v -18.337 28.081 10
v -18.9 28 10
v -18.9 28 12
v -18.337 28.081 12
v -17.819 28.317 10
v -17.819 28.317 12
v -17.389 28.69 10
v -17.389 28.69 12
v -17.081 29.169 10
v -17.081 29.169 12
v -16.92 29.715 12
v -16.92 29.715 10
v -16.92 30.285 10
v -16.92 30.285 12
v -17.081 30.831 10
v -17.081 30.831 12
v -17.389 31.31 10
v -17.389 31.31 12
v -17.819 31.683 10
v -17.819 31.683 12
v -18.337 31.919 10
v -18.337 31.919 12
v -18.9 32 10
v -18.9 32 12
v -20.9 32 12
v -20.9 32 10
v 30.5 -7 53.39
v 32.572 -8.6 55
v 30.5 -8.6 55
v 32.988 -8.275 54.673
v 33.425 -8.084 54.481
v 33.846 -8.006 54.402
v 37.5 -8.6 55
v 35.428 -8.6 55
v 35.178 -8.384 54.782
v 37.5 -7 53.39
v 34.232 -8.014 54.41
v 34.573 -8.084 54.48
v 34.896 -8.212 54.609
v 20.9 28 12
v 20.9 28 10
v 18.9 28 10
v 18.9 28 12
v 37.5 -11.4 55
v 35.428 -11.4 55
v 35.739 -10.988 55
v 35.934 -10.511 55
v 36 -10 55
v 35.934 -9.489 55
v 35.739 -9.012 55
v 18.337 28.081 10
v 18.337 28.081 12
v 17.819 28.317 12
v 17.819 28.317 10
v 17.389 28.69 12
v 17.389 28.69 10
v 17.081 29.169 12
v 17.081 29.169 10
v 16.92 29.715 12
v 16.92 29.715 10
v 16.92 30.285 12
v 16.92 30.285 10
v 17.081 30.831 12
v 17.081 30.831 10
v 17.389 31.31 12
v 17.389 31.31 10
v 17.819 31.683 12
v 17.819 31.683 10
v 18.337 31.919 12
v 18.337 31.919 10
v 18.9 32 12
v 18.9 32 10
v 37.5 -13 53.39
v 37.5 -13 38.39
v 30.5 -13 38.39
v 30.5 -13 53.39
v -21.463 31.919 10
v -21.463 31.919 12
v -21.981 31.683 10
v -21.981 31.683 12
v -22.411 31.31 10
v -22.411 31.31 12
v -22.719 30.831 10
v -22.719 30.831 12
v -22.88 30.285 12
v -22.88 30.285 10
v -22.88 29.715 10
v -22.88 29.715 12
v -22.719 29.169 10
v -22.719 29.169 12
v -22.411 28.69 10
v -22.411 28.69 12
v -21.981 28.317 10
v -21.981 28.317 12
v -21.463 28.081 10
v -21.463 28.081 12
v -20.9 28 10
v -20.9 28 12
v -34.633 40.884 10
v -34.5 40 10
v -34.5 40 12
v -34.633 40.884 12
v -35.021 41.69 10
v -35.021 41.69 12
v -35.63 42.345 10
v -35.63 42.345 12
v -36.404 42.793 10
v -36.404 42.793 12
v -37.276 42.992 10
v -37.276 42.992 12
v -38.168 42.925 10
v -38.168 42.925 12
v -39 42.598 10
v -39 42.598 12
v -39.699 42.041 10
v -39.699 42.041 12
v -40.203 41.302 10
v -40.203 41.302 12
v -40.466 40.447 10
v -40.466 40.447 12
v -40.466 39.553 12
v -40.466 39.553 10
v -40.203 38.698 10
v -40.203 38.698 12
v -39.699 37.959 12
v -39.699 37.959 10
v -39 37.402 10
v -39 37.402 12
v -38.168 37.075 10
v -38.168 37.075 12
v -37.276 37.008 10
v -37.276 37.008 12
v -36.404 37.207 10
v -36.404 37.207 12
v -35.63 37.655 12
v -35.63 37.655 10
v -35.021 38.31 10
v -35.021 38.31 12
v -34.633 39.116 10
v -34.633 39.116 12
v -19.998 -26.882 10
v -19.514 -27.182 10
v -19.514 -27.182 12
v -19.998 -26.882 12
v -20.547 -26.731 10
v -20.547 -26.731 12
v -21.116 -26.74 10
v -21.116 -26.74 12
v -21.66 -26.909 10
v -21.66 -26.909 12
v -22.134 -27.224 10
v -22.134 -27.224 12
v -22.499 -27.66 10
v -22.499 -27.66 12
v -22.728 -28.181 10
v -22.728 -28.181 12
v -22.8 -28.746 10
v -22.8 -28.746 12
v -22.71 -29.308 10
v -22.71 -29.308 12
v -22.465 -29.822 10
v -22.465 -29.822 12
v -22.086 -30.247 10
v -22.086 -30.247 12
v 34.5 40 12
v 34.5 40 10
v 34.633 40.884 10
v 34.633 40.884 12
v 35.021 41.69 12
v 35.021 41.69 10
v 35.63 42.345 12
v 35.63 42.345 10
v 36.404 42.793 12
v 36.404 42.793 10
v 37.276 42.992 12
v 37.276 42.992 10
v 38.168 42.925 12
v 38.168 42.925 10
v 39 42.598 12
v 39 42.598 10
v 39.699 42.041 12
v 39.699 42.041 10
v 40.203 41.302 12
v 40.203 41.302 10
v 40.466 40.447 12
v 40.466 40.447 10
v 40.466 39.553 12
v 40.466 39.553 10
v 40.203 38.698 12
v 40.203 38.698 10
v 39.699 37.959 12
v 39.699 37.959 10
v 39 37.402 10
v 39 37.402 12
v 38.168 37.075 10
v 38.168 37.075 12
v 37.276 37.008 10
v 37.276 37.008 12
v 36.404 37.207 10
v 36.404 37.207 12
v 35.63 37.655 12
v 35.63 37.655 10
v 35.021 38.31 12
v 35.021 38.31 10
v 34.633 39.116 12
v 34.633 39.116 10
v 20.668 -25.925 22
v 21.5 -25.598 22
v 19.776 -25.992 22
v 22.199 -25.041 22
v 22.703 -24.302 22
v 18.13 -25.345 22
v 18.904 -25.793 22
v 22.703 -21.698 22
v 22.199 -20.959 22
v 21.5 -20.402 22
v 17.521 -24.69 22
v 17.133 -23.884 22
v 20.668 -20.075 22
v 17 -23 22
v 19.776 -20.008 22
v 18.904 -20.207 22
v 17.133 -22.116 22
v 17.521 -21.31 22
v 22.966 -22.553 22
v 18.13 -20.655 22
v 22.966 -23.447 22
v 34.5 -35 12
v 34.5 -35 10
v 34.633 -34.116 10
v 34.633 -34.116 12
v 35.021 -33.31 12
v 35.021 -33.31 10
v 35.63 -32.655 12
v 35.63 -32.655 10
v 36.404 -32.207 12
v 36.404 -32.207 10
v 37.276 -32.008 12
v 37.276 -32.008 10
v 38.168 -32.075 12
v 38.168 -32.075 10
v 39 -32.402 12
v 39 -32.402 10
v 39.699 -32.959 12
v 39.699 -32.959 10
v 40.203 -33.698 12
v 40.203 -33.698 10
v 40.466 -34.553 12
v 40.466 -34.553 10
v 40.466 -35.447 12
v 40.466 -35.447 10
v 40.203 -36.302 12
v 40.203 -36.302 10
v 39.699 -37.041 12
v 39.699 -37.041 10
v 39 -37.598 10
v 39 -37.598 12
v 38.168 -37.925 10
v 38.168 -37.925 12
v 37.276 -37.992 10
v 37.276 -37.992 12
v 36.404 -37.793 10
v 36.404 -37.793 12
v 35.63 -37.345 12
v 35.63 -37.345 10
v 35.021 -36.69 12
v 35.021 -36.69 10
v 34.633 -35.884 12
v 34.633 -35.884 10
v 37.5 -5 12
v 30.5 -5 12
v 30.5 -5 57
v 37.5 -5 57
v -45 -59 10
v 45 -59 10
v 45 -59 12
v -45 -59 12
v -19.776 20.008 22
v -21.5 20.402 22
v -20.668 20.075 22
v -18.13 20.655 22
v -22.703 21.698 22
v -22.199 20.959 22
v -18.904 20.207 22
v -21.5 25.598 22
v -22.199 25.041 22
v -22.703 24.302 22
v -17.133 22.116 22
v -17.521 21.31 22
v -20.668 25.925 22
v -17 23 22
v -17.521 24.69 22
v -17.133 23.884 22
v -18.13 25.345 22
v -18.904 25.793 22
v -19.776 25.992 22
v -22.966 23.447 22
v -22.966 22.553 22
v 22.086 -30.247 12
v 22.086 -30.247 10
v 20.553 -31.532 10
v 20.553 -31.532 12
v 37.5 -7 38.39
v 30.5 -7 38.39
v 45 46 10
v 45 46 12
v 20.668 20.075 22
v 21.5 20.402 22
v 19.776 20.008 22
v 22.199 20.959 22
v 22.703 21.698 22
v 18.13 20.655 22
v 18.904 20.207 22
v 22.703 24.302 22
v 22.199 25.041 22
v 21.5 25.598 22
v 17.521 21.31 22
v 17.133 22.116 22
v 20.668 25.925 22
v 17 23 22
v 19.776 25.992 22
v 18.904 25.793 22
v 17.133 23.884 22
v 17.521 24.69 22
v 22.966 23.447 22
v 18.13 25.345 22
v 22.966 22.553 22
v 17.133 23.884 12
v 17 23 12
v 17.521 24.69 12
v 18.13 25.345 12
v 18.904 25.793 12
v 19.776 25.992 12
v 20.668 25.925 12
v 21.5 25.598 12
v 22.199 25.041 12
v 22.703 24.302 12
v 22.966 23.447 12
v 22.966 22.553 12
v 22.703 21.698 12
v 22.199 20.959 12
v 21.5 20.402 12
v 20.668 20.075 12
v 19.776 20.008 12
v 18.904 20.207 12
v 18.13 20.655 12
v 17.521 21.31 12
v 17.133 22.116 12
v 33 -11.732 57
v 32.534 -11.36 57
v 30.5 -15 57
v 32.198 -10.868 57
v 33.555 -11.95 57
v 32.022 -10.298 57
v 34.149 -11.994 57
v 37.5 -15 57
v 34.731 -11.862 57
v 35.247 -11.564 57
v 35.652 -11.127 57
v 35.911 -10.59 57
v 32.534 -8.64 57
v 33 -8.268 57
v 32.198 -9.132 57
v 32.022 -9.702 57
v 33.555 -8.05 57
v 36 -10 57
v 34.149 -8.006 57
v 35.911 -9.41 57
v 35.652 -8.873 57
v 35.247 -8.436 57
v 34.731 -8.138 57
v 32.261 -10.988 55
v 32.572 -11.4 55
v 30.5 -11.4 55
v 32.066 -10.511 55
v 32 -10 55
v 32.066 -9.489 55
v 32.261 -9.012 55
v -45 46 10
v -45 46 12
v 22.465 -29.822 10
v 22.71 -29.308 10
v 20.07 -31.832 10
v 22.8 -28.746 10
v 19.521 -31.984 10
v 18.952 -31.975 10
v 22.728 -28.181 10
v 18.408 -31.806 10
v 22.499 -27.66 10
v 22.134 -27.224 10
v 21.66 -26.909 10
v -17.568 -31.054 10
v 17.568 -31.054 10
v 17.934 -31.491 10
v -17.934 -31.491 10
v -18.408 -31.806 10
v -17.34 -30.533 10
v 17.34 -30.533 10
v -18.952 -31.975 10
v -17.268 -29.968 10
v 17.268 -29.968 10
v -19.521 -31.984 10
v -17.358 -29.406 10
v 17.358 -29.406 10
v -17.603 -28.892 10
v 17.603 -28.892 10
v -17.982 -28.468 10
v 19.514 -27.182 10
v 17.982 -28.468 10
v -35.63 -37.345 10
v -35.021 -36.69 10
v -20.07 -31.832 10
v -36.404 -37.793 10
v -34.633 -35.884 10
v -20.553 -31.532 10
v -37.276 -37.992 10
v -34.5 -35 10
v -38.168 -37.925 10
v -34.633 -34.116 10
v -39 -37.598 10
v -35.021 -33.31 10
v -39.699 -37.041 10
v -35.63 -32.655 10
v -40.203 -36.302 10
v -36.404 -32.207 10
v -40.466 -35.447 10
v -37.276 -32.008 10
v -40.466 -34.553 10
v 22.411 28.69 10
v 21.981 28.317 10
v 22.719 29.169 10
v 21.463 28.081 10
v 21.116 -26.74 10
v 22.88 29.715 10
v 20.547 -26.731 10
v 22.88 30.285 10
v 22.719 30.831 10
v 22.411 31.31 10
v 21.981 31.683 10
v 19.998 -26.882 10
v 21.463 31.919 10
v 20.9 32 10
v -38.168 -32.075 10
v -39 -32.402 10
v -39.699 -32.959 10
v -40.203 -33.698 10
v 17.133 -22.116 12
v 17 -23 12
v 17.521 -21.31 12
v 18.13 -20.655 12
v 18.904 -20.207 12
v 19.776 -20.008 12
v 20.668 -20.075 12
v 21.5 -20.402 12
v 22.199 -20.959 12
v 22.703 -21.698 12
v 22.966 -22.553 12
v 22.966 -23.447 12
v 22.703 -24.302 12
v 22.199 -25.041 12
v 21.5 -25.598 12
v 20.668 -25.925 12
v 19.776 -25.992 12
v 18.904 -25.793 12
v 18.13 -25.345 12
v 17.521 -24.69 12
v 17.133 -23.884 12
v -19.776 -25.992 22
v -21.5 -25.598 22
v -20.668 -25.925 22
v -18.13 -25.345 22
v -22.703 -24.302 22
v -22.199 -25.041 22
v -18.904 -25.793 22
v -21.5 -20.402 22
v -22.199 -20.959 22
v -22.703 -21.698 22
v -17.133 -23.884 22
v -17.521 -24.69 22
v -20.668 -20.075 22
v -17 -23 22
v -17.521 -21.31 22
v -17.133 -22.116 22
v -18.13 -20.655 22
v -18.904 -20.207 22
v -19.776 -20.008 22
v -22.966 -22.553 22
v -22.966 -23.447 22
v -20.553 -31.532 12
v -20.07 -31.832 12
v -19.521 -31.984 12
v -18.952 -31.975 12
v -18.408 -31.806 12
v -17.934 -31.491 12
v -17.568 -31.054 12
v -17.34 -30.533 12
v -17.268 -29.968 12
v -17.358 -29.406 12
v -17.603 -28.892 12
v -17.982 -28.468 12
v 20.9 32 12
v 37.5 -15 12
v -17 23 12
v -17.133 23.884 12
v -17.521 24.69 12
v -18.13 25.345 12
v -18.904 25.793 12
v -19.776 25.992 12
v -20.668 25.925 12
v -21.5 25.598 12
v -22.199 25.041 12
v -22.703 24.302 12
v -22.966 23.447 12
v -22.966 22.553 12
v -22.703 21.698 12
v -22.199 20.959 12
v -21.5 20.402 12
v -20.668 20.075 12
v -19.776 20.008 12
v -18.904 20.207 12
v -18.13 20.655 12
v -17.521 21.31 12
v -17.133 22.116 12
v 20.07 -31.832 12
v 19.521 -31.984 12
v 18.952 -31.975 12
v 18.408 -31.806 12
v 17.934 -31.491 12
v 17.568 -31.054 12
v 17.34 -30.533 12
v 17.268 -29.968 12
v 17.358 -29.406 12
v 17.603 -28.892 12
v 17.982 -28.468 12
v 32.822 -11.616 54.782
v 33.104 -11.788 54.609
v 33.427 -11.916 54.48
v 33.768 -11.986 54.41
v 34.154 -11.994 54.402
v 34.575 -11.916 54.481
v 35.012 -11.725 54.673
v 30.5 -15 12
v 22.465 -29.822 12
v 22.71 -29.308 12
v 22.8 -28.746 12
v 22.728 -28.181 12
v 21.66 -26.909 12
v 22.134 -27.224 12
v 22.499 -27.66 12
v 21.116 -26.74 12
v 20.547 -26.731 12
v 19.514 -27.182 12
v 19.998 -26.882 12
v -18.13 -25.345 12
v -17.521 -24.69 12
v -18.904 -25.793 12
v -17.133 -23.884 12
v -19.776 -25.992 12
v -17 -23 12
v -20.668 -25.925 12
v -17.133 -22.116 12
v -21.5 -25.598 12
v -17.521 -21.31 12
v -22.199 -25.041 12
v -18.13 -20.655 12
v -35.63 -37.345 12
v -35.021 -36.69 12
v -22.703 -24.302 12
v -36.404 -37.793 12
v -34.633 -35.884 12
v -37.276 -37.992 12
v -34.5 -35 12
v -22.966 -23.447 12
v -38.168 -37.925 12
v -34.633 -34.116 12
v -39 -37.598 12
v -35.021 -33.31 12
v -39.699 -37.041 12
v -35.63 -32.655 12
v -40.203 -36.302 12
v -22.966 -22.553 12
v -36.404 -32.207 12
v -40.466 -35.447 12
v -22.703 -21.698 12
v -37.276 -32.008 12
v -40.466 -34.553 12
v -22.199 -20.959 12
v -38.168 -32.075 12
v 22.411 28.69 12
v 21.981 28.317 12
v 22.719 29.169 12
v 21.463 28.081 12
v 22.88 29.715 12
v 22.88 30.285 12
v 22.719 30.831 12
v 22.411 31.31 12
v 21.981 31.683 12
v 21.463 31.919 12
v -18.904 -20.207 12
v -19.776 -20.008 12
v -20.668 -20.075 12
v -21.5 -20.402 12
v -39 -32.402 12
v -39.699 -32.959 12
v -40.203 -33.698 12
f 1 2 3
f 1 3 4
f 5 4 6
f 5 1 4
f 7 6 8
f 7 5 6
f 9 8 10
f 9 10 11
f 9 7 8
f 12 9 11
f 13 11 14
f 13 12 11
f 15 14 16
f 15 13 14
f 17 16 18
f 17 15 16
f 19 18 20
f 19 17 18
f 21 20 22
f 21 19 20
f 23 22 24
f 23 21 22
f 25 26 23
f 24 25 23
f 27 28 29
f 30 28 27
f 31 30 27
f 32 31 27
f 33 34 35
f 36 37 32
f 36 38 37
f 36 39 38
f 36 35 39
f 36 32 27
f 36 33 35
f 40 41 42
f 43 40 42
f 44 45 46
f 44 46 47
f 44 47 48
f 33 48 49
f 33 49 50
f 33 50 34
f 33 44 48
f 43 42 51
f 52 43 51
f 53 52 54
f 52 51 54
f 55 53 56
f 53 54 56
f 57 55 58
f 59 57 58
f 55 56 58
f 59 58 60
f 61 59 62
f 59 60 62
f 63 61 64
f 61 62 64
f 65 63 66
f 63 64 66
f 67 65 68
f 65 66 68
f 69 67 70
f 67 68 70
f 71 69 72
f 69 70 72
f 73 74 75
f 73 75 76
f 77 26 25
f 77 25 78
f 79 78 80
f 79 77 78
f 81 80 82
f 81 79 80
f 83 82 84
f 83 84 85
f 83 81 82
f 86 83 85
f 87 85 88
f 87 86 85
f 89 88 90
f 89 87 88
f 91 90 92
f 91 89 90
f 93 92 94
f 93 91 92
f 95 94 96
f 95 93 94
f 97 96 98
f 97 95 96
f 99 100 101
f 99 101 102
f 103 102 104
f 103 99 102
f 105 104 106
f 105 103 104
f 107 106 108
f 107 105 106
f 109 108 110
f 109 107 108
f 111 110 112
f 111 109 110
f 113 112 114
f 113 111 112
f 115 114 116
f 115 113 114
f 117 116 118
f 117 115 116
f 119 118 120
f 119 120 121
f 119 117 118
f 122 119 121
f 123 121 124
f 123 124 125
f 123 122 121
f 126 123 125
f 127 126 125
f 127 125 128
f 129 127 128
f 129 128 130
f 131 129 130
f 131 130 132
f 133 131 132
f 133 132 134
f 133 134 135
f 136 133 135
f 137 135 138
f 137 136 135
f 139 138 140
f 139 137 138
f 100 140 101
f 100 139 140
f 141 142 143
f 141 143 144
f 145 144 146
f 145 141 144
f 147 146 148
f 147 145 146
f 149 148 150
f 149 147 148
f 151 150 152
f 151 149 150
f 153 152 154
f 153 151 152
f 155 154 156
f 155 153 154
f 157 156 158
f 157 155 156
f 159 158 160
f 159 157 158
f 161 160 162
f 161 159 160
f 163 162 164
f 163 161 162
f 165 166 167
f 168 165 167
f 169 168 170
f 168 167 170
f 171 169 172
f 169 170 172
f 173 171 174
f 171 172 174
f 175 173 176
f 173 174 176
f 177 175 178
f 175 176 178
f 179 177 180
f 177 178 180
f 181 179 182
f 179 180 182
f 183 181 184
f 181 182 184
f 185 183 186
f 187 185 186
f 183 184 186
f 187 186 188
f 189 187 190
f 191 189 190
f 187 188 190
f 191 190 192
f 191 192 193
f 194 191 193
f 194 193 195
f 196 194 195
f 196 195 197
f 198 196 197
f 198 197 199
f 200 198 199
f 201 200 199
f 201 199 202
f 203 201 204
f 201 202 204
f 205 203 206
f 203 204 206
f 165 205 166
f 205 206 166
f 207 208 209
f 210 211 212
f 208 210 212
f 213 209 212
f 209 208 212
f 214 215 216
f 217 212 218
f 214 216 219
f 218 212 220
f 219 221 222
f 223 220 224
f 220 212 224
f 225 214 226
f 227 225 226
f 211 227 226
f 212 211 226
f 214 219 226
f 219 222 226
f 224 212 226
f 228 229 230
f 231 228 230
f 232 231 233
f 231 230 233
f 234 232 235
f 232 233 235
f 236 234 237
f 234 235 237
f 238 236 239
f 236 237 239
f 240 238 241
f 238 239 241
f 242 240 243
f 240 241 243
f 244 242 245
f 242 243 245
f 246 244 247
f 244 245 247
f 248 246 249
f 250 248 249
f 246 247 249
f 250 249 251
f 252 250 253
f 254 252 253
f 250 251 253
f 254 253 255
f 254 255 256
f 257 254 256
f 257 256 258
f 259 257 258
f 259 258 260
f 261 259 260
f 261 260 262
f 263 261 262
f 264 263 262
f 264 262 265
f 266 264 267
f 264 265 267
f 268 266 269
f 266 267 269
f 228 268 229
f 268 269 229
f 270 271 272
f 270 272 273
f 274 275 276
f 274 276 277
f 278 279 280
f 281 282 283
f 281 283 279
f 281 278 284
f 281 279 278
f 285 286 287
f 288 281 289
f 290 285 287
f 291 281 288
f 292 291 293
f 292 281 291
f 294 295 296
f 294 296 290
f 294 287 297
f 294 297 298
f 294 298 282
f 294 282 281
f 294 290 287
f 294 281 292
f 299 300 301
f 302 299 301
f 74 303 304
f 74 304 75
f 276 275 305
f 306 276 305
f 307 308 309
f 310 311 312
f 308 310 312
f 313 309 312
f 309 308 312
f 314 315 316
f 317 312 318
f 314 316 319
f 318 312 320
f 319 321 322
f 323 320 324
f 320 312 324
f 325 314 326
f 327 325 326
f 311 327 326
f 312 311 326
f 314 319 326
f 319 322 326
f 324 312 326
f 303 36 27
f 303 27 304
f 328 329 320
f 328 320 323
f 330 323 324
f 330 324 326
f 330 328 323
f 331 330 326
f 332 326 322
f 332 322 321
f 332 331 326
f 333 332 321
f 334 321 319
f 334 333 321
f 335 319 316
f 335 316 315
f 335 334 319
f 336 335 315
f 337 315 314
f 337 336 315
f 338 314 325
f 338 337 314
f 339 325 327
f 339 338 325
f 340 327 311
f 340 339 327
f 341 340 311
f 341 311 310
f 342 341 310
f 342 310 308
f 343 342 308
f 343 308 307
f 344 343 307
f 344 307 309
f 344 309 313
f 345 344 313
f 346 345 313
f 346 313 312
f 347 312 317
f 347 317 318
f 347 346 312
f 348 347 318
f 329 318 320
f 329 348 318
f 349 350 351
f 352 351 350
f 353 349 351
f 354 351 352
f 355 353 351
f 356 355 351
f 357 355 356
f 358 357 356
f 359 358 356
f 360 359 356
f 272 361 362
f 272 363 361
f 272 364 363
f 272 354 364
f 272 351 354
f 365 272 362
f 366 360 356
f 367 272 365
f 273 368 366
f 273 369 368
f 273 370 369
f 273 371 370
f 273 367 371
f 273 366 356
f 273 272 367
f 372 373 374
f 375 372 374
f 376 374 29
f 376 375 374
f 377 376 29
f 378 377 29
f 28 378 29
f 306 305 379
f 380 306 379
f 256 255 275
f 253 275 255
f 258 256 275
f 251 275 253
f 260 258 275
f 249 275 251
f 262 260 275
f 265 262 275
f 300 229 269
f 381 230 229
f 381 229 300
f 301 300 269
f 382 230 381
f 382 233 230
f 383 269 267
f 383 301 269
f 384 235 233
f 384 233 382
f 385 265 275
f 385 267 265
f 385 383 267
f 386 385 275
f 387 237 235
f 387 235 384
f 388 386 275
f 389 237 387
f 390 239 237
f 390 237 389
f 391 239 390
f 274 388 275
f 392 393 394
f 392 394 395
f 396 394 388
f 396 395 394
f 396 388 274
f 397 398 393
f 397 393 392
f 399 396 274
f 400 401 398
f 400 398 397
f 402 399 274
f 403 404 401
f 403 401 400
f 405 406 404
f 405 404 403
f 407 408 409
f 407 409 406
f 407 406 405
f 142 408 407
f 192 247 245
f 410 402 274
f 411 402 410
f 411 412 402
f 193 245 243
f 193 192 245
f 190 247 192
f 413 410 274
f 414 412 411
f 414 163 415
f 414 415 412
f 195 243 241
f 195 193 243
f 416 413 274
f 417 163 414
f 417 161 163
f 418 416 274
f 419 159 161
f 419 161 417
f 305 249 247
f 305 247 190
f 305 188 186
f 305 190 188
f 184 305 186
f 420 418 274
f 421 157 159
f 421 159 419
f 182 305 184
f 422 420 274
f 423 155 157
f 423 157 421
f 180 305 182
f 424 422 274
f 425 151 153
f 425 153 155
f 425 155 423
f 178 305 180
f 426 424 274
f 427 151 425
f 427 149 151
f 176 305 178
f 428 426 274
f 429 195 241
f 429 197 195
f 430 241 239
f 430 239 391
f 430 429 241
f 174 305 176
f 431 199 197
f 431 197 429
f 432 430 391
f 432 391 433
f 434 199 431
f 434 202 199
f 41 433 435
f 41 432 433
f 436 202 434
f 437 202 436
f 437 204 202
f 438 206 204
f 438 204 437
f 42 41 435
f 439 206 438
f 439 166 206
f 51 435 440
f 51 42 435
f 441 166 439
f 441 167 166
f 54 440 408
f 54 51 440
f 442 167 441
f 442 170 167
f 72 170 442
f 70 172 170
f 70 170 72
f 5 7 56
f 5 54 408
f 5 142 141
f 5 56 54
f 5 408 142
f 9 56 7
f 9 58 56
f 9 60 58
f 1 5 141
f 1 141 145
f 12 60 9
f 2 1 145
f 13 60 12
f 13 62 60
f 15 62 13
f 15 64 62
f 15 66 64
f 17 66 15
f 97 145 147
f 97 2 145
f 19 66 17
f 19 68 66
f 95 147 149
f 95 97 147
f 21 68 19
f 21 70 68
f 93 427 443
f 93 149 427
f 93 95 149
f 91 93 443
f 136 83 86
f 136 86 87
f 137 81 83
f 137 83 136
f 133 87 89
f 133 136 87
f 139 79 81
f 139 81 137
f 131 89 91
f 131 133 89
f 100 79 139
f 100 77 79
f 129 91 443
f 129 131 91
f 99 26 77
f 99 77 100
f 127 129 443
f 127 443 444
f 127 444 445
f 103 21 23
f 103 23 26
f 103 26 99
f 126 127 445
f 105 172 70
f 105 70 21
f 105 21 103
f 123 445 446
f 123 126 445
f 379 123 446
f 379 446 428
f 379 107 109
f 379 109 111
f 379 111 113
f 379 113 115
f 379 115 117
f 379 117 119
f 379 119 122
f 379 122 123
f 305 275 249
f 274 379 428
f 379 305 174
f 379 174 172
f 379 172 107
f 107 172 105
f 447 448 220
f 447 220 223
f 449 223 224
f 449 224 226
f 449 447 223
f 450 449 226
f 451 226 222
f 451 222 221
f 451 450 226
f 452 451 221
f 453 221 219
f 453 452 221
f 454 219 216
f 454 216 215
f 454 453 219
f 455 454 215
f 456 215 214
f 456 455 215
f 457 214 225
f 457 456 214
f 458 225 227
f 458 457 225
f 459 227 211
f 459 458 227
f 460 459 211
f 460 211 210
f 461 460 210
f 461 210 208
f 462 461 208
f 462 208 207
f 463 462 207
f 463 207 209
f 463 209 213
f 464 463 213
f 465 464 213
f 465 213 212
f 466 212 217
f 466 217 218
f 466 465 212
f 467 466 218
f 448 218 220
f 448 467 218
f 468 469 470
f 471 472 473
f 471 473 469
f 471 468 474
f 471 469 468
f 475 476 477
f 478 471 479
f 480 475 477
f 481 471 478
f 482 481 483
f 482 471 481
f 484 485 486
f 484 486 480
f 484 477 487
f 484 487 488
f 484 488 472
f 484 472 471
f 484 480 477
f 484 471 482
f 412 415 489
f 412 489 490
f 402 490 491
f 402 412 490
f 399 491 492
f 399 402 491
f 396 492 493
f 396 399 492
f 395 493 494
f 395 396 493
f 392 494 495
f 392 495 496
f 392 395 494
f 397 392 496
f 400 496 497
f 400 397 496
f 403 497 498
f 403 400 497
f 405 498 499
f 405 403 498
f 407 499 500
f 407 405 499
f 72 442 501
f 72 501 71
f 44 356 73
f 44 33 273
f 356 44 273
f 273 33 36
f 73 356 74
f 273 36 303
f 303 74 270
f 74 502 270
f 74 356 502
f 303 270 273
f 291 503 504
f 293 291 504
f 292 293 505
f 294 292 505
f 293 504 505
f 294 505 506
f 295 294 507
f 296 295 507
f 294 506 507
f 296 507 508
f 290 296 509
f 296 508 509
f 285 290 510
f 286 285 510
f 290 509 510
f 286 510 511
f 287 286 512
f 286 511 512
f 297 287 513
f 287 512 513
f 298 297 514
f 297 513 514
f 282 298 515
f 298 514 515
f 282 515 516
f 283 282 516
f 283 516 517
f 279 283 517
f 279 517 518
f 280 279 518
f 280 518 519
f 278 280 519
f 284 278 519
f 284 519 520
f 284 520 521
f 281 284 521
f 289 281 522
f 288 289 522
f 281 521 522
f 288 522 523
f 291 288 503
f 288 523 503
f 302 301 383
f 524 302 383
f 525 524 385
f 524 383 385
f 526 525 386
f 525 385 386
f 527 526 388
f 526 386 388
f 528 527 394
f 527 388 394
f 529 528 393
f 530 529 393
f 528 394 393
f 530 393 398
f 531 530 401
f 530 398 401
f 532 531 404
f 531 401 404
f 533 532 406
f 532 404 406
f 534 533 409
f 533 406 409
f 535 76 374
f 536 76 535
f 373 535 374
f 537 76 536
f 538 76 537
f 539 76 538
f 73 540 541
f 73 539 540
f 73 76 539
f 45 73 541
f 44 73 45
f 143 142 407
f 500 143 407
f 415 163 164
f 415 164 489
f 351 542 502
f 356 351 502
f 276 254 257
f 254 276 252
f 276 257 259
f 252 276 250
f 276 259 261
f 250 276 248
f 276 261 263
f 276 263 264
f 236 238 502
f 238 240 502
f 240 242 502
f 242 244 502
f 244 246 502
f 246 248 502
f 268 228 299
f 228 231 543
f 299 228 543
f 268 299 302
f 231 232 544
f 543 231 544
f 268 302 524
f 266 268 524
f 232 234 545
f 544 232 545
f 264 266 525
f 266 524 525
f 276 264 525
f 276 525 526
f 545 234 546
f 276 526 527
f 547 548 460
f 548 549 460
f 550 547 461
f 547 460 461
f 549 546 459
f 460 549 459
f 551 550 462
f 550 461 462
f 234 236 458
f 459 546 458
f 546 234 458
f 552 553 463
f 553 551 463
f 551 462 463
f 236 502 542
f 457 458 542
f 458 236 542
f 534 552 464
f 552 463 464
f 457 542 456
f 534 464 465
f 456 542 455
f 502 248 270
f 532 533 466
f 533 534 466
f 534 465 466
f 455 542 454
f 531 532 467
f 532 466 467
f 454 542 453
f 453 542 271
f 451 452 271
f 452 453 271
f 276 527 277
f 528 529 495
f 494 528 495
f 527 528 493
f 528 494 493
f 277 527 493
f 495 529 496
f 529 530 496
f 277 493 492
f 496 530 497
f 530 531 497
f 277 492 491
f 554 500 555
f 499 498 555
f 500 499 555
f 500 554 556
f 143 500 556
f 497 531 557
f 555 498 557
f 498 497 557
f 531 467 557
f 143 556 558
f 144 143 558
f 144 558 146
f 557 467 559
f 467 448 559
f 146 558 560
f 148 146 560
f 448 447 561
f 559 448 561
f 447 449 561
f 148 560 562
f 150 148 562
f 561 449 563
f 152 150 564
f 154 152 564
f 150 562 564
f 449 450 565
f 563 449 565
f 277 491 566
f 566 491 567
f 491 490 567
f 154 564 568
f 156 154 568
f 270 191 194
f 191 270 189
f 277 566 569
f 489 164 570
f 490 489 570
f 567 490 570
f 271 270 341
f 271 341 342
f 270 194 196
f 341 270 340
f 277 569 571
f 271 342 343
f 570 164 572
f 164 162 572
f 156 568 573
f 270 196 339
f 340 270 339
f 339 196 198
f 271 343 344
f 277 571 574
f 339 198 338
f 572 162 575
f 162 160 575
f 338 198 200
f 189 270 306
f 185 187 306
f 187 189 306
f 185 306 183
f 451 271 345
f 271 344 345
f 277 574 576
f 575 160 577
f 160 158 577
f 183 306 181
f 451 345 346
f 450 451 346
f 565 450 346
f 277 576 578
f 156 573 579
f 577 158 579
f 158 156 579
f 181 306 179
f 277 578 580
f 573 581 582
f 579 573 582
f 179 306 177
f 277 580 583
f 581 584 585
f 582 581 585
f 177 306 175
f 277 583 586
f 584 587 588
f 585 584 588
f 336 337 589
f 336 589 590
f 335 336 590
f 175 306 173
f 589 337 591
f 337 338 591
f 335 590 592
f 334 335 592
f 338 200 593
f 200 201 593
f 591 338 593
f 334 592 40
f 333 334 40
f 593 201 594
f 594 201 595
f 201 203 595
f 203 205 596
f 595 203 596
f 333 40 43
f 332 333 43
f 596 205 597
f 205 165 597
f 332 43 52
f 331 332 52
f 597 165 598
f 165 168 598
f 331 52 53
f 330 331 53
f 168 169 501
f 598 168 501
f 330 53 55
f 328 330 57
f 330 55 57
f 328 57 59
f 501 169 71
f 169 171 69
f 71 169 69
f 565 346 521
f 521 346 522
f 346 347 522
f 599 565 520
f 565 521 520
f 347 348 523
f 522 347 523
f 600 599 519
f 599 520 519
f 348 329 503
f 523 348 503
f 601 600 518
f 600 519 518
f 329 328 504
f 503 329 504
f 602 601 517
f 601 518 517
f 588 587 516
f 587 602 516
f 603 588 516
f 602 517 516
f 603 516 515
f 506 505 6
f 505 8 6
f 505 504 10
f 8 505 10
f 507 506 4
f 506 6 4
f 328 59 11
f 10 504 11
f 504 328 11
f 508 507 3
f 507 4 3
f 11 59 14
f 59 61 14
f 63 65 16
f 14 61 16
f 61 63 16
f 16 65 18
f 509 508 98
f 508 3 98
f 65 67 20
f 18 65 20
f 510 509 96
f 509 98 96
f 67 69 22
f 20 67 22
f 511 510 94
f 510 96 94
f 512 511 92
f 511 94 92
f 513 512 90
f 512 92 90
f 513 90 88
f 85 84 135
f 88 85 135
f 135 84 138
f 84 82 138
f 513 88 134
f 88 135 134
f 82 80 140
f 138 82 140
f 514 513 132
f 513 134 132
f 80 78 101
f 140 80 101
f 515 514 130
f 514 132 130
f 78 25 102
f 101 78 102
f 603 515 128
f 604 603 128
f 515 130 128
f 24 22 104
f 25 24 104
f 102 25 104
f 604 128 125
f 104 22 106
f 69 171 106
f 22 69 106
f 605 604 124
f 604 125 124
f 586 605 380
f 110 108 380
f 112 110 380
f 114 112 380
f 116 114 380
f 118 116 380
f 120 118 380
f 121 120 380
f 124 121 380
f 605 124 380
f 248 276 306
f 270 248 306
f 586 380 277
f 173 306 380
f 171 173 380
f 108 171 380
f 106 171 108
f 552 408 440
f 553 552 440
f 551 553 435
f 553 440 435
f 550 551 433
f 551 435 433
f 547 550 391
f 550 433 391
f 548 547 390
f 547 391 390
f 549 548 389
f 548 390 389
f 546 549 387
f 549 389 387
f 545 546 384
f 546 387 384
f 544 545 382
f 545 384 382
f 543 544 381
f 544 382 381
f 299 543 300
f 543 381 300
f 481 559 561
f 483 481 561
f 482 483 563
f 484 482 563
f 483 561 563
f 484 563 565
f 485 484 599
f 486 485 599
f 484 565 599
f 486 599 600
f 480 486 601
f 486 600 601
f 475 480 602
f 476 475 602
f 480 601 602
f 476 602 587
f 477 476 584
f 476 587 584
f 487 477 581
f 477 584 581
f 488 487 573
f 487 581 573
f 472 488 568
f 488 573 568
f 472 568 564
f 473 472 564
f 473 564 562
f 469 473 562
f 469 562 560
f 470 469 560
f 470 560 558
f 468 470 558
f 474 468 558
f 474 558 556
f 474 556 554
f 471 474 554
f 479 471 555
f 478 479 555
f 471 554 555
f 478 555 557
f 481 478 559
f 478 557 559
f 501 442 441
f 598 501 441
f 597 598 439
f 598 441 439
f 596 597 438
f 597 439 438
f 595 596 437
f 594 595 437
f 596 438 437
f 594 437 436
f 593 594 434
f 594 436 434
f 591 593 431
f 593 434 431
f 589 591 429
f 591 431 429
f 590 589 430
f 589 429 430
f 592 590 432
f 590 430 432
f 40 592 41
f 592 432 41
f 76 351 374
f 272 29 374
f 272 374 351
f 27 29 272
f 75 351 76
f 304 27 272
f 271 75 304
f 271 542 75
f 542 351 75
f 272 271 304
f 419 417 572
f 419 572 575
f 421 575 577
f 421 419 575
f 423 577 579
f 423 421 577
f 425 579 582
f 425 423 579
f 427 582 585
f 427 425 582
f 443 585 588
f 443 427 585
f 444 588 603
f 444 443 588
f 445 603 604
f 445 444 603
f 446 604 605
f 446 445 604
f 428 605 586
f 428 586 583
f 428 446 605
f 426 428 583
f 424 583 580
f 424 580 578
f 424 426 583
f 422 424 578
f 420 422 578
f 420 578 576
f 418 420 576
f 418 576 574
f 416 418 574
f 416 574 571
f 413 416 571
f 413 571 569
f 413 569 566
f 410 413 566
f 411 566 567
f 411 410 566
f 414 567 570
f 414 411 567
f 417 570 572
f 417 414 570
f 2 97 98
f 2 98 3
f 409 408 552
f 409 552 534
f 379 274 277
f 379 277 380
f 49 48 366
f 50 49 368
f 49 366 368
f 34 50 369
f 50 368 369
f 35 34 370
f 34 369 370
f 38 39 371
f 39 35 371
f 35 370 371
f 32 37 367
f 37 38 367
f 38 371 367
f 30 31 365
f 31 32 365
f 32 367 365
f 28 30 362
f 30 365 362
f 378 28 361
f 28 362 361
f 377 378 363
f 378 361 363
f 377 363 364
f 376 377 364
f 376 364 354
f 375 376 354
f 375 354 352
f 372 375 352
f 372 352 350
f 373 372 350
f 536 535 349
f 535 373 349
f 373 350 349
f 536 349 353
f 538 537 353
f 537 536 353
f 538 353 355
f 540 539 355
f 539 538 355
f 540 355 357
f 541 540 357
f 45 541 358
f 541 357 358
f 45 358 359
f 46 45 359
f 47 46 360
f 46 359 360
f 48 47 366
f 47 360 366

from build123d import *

# Parameters (mm, degrees)
SKETCH001_W     = 45
SKETCH001_H     = 105
SKETCH001_R     = 3
PAD_DEPTH       = 2
SKETCH_R        = 3
PAD001_DEPTH    = 10
SKETCH004_W     = 7
SKETCH004_H     = 10
PAD003_DEPTH    = 45
POCKET001_DEPTH = 82.501
SKETCH006_R     = 2
POCKET002_DEPTH = 5


with BuildPart() as part:
    # Sketch001 → Pad (new body)
    with BuildSketch(Plane.XY.offset(10)):
        with Locations((-22.5, -6.5)):
            Rectangle(SKETCH001_W, SKETCH001_H)
        with Locations((-37.5, 40)):
            Circle(SKETCH001_R, mode=Mode.SUBTRACT)
        with Locations((-37.5, -35)):
            Circle(SKETCH001_R, mode=Mode.SUBTRACT)
        with BuildLine():
            ThreePointArc((-20.9, 32), (-22.9, 30), (-20.9, 28))
            Line((-20.9, 28), (-18.9, 28))
            ThreePointArc((-18.9, 28), (-16.9, 30), (-18.9, 32))
            Line((-20.9, 32), (-18.9, 32))
        make_face(mode=Mode.SUBTRACT)
        with BuildLine():
            ThreePointArc((-19.514425, -27.18234), (-22.332089, -27.428853), (-22.085575, -30.246517))
            Line((-22.085575, -30.246517), (-20.553491, -31.532089))
            ThreePointArc((-20.553491, -31.532089), (-17.735828, -31.285577), (-17.982336, -28.467915))
            Line((-19.514425, -27.18234), (-17.982336, -28.467915))
        make_face(mode=Mode.SUBTRACT)
    pad = extrude(amount=PAD_DEPTH)

    # Sketch (on Face16 of Pad) → Pad001 (join)
    with BuildSketch(Plane.XY.offset(12)):
        with Locations((-20, -23)):
            Circle(SKETCH_R)
        with Locations((-20, 23)):
            Circle(SKETCH_R)
    pad001 = extrude(amount=PAD001_DEPTH)

    # Mirrored: Pad across Sketch001 V_Axis
    add(pad.mirror(Plane(origin=(0, 0, 10), x_dir=(0, 0, 1), z_dir=(1, 0, 0))))

    # Mirrored001: Pad001 across Sketch V_Axis
    add(pad001.mirror(Plane(origin=(0, 0, 12), x_dir=(0, 0, 1), z_dir=(1, 0, 0))))

    # Sketch004 → Pad003 (join)
    with BuildSketch(Plane.XY.offset(12)):
        with Locations((34, -10)):
            Rectangle(SKETCH004_W, SKETCH004_H)
    extrude(amount=PAD003_DEPTH)

    # Sketch005 (on Face36 of Pad003) → Pocket001 (cut, through all)
    with BuildSketch(Plane(origin=(37.5, 0, 10), x_dir=(0, 1, 0), z_dir=(1, 0, 0))):
        Polygon((-7, 28.39), (-13, 28.39), (-13, 43.39), (-11.4, 45), (-8.6, 45), (-7, 43.39), align=None)
    extrude(amount=-POCKET001_DEPTH, mode=Mode.SUBTRACT)

    # Sketch006 (on Face42 of Pocket001) → Pocket002 (cut)
    with BuildSketch(Plane.XY.offset(57)):
        with Locations((34, -10)):
            Circle(SKETCH006_R)
    extrude(amount=-POCKET002_DEPTH, mode=Mode.SUBTRACT)


solid = part.part
